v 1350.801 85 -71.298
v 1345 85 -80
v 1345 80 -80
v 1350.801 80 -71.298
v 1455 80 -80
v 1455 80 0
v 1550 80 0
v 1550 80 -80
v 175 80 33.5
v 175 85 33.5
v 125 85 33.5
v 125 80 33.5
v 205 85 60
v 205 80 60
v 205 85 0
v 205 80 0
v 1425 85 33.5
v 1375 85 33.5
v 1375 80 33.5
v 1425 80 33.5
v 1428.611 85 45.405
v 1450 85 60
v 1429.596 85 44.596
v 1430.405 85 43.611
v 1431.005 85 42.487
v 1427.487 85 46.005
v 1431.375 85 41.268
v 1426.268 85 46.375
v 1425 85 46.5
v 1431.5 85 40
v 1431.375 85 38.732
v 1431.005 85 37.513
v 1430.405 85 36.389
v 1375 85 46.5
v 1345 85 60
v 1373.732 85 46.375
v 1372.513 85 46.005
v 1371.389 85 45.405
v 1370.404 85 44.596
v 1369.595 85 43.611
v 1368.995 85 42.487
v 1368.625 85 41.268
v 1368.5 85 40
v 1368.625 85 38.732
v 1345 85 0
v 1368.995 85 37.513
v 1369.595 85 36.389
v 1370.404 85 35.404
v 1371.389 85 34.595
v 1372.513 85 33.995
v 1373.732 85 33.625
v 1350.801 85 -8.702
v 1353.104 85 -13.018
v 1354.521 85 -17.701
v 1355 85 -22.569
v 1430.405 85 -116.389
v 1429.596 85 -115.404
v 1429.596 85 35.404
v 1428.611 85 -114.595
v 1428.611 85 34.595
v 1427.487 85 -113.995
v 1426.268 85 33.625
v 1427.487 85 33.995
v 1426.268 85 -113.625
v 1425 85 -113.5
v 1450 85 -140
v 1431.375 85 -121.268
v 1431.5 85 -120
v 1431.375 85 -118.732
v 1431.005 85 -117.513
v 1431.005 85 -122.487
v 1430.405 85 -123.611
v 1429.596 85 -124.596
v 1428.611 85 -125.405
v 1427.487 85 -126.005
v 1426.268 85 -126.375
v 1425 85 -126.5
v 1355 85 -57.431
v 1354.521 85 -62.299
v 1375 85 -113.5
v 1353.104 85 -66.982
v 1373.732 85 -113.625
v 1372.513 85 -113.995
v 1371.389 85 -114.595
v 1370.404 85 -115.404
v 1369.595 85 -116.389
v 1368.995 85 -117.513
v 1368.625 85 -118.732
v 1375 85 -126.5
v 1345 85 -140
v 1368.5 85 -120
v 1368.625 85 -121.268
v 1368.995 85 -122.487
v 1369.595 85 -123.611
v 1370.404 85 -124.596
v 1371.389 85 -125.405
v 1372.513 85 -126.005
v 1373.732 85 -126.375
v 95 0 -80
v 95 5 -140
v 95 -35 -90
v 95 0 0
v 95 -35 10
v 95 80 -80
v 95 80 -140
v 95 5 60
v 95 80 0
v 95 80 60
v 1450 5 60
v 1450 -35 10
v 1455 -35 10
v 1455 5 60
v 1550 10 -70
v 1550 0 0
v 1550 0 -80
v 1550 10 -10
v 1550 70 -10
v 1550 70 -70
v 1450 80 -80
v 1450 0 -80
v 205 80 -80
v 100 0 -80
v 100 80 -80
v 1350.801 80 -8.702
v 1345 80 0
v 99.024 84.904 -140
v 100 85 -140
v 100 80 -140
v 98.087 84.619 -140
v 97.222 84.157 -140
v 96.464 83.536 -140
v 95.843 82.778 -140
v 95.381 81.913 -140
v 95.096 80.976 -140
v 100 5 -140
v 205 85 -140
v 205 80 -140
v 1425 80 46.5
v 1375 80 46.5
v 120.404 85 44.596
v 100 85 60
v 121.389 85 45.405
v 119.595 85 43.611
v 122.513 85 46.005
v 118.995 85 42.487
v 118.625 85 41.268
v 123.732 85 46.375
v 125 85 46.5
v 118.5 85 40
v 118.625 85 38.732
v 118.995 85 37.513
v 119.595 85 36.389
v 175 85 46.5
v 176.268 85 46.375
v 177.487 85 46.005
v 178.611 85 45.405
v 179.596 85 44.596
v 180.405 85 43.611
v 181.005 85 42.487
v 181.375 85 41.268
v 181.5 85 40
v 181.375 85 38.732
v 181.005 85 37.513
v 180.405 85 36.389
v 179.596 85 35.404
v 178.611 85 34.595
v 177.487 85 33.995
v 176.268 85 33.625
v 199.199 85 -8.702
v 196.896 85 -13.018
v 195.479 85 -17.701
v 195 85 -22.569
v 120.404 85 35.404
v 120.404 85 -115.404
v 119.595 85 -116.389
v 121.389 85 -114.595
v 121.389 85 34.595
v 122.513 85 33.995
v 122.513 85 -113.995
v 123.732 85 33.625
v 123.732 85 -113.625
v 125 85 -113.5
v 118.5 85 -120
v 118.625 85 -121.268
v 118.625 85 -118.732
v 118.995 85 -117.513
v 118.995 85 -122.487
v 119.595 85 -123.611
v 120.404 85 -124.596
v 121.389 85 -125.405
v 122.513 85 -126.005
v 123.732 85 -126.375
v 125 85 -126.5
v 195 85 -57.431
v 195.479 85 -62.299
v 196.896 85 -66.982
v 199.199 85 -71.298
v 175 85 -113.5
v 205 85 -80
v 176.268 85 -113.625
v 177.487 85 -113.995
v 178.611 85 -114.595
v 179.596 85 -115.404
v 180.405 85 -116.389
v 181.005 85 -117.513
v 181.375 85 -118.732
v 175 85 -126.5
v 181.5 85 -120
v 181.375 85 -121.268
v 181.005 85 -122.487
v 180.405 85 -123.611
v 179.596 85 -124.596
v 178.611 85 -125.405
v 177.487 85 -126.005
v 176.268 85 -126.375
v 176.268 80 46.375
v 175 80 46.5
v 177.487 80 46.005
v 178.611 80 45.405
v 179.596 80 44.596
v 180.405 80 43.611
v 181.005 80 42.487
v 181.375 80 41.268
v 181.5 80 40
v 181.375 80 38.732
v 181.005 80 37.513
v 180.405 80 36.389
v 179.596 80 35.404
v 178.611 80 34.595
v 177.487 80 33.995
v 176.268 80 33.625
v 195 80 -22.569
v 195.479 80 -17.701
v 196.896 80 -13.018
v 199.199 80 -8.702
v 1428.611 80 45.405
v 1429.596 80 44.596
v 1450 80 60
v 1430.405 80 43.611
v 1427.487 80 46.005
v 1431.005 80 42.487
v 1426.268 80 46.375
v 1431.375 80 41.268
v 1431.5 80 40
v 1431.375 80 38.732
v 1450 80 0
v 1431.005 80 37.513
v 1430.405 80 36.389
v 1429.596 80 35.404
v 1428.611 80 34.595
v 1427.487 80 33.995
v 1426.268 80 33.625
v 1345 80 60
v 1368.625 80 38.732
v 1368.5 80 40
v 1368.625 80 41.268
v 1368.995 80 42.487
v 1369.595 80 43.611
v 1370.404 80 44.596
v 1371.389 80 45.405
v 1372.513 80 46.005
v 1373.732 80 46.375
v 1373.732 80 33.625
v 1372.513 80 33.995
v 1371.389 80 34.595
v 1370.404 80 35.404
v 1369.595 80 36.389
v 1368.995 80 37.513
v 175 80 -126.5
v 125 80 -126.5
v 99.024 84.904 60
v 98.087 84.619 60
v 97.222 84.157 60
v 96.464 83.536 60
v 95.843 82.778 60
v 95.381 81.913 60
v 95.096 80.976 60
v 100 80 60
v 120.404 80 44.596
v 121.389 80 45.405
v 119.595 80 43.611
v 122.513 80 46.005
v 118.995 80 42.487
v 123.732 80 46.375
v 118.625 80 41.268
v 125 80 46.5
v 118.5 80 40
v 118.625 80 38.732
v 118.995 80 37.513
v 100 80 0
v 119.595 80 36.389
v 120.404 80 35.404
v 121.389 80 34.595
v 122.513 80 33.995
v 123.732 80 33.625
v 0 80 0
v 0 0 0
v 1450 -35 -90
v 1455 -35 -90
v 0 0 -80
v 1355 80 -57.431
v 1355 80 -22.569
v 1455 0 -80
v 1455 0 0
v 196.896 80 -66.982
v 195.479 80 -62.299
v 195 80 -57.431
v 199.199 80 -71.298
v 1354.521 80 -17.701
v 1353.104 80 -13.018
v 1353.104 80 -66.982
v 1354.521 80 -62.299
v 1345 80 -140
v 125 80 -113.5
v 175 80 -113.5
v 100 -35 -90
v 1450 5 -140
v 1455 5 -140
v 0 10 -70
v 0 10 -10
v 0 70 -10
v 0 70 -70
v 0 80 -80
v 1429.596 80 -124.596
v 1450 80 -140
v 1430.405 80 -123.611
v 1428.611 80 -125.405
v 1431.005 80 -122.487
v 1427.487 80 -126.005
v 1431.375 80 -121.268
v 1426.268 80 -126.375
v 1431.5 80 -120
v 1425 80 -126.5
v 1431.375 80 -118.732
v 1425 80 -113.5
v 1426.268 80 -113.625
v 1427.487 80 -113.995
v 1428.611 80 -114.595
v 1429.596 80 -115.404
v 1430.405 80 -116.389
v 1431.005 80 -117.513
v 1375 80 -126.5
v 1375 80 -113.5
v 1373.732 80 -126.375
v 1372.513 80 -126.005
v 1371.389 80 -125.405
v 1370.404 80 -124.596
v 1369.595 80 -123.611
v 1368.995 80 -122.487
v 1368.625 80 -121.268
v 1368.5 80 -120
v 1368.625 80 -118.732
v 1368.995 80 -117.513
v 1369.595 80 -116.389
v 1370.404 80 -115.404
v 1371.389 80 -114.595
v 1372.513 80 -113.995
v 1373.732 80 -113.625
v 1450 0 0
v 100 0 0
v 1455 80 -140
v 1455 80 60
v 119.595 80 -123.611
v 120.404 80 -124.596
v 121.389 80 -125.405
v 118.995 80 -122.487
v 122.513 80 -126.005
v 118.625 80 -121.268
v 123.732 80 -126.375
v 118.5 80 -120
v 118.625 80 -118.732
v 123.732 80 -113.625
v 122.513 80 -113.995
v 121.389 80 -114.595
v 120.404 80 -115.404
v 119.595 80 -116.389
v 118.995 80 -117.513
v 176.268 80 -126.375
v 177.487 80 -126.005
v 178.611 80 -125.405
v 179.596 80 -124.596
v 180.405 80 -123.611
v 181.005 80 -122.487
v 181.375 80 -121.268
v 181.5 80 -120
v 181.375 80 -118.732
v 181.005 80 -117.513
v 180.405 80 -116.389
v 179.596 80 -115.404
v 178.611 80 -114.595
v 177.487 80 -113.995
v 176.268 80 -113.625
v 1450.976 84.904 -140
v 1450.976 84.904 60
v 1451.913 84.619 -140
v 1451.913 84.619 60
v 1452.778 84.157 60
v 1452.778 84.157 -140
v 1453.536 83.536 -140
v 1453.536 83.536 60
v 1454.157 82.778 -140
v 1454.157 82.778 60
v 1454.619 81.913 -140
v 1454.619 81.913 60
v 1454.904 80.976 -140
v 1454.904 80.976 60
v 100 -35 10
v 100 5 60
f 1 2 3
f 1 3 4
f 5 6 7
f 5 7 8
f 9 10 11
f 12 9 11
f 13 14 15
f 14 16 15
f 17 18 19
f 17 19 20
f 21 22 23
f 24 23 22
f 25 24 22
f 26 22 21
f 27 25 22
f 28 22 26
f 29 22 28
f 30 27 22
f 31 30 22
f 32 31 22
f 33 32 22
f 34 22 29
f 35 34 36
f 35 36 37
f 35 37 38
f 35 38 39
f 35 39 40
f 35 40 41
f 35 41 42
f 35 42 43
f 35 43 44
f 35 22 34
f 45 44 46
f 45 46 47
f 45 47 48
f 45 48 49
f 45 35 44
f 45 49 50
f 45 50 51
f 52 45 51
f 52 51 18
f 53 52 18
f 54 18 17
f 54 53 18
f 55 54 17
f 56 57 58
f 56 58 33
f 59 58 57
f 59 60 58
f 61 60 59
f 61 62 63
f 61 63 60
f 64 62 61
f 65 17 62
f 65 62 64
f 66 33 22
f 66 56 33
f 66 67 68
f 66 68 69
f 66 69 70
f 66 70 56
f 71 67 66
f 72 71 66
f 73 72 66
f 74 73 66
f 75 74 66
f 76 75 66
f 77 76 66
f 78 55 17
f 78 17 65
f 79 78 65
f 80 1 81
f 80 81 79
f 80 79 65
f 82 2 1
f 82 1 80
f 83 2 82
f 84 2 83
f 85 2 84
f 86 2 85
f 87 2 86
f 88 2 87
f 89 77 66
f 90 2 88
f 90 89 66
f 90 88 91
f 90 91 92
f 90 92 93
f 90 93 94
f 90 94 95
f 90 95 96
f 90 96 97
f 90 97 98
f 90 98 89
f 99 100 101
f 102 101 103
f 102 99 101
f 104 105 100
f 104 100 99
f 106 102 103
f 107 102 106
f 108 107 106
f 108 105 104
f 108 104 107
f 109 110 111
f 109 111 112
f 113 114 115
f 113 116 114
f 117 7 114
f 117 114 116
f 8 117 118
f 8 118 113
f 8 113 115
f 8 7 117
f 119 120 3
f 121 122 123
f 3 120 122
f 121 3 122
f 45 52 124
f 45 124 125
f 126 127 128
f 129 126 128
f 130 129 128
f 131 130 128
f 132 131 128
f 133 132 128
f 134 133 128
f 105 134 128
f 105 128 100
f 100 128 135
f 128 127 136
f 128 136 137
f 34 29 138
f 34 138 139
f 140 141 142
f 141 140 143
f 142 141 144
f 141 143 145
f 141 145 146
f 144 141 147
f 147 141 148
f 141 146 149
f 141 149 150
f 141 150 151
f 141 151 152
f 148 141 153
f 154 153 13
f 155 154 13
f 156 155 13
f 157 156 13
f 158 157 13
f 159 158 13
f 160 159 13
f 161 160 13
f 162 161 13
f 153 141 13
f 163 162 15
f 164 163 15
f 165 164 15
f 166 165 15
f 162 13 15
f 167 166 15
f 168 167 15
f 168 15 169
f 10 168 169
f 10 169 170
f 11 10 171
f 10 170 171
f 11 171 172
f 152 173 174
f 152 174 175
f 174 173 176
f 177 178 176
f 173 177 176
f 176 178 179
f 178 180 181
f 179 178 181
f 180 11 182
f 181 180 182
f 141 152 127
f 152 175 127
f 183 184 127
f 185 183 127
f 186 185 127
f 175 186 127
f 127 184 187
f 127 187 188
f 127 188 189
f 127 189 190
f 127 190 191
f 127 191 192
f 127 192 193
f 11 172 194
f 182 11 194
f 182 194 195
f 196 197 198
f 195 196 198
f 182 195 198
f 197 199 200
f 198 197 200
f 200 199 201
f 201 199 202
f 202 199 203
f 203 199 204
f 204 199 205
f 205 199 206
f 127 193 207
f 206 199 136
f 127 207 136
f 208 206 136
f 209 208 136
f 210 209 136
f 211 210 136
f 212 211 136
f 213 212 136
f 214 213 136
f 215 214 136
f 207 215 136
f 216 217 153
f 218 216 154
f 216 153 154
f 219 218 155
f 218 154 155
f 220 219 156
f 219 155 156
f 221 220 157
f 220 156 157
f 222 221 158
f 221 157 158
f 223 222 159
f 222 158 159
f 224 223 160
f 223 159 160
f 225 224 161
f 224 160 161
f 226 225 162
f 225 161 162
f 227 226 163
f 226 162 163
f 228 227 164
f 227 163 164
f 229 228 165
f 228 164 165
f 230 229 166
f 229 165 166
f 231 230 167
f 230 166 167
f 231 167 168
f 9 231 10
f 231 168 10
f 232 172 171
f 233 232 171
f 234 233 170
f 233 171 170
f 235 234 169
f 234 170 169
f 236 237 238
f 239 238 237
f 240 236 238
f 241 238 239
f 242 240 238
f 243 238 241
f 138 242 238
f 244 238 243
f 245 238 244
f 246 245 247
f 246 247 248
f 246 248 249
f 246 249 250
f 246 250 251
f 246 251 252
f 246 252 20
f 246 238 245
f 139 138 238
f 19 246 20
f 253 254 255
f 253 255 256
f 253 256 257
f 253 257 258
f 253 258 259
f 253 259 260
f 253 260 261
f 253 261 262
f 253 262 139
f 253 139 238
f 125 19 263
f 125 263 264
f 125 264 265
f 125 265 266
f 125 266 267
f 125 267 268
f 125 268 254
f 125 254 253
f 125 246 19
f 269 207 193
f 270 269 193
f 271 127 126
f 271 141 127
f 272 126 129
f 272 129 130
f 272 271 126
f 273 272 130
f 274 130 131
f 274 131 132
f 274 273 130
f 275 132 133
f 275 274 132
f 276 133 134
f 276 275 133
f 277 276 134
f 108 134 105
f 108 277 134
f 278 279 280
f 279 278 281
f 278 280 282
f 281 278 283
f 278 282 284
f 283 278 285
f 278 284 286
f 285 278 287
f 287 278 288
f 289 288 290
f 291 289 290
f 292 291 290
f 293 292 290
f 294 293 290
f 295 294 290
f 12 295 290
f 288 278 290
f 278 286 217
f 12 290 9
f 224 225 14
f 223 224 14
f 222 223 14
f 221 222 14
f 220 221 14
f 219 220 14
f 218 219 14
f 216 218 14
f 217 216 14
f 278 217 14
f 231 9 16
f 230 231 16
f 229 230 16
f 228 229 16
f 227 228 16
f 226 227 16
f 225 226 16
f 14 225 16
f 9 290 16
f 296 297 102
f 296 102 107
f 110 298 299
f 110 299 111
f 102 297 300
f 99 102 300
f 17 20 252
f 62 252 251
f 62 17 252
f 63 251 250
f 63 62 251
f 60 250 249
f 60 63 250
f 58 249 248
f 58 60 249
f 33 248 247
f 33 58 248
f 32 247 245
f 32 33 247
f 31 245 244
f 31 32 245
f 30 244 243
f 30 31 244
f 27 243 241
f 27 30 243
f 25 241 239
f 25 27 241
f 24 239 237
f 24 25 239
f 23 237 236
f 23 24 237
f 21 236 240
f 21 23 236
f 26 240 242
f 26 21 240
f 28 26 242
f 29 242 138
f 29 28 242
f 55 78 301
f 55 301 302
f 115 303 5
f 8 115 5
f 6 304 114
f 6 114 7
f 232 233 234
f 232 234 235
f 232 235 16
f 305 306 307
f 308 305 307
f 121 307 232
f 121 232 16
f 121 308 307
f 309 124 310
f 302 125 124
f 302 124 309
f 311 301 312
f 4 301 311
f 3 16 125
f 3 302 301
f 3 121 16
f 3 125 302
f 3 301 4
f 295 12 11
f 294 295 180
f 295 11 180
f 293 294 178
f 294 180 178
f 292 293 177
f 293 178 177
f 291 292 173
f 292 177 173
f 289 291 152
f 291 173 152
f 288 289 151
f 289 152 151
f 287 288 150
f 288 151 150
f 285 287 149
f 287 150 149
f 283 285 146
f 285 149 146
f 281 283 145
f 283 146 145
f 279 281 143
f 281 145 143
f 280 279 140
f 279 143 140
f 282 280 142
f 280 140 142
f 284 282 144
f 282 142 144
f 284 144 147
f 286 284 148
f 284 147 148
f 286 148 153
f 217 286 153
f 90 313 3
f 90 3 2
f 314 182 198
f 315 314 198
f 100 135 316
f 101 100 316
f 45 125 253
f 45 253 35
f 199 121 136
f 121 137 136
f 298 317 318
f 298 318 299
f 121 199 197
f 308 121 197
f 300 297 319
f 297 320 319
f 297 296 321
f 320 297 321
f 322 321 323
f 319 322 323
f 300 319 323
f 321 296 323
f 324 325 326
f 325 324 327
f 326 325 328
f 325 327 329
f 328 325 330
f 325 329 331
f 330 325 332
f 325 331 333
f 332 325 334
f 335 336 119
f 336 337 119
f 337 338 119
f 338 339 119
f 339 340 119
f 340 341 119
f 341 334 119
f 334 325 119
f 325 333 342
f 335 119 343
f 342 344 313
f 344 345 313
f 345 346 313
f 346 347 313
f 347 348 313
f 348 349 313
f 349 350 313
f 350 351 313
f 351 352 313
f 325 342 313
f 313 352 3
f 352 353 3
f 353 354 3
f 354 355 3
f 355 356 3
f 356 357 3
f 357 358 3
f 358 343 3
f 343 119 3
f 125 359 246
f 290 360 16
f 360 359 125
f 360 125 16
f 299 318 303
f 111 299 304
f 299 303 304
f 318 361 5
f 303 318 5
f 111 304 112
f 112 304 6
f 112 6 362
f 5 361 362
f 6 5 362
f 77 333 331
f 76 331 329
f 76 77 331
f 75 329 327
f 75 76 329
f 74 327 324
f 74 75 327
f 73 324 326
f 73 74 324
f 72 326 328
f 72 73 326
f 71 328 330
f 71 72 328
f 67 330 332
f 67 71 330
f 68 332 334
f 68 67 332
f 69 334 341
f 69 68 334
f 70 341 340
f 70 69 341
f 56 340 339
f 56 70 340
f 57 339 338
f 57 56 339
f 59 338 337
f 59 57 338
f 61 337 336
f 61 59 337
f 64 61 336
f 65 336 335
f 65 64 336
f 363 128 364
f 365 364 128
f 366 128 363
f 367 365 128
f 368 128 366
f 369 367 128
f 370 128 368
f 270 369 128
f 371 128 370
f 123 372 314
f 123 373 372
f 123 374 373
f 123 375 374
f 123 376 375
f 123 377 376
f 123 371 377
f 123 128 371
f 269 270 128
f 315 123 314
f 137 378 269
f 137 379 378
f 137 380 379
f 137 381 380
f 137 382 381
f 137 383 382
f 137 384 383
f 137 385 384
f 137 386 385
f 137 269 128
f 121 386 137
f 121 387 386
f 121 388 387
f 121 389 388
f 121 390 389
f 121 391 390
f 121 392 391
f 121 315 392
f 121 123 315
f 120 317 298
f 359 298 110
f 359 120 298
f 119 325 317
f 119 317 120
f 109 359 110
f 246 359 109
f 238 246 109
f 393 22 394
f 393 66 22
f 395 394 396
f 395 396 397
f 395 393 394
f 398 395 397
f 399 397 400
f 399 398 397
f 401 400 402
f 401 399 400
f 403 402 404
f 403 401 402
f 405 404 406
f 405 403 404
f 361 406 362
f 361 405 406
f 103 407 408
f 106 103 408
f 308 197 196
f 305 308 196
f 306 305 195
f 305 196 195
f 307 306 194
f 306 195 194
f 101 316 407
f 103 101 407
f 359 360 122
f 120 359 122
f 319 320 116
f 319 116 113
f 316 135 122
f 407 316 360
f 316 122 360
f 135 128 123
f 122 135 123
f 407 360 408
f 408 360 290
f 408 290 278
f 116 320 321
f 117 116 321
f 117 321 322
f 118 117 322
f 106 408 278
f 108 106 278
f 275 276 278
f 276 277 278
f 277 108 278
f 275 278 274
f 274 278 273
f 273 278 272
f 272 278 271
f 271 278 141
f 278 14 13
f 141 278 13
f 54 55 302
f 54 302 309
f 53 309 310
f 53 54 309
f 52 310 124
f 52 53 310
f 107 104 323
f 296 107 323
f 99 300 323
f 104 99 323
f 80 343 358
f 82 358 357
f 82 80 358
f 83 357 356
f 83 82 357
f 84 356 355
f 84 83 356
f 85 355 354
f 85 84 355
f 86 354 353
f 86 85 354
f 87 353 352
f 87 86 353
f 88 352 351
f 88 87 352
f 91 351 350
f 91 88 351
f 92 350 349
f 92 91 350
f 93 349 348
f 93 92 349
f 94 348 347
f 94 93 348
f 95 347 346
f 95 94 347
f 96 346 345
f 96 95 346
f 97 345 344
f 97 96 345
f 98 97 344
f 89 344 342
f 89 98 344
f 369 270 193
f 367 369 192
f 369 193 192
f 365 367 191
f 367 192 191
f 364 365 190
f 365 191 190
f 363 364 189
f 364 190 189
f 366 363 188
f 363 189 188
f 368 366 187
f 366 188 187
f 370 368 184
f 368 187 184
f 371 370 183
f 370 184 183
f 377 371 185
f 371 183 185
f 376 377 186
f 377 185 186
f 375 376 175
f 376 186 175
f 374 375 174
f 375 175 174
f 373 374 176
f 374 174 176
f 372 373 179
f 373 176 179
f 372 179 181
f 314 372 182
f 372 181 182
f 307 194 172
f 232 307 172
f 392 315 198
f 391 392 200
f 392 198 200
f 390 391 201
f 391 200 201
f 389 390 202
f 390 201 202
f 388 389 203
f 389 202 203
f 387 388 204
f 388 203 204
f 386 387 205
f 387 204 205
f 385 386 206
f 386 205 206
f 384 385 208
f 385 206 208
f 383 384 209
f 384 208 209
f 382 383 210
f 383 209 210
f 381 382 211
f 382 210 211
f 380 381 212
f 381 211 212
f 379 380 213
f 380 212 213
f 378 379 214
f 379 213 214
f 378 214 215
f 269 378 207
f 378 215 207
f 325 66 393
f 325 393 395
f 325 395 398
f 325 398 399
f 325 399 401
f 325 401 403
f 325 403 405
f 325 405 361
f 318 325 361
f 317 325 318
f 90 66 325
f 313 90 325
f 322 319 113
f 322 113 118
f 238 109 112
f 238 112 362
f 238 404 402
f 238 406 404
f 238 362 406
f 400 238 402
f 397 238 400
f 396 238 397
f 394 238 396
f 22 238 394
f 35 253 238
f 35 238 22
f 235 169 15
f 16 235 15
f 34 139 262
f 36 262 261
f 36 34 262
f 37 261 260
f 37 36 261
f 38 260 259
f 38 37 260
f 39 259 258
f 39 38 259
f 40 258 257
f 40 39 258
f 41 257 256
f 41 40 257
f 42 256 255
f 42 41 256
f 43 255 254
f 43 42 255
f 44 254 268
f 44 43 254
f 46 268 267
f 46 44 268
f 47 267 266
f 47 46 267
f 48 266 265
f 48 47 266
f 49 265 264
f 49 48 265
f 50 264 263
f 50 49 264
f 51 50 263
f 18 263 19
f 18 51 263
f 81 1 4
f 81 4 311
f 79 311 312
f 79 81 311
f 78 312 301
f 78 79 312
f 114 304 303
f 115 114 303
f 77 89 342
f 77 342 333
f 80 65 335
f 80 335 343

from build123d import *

# Parameters (mm, degrees)
SKETCH3_W                       = 80
SKETCH3_H                       = 80
SKETCH3_W_2                     = 60
SKETCH3_H_2                     = 60
BOSS_EXTRUDE2_DEPTH             = 1550
SKETCH7_W                       = 60
SKETCH7_H                       = 60
BOSS_EXTRUDE3_DEPTH             = 5
BOSS_EXTRUDE4_REACH             = 1560.629
SKETCH8_W                       = 110
SKETCH8_H                       = 5
BOSS_EXTRUDE4_DIRECTION_2_REACH = 1560.629
CUT_EXTRUDE1_DEPTH              = 5
CUT_EXTRUDE2_REACH              = 1562.929
FILLET1_R                       = 5
FILLET1_OF_MIRROR1_R            = 5
FILLET1_OF_MIRROR2_R            = 5


with BuildPart() as part:
    # Sketch3 → Boss-Extrude2 (new body)
    with BuildSketch(Plane(origin=(0, 0, 0), x_dir=(0, 0, -1), z_dir=(1, 0, 0))):
        with Locations((40, 40)):
            Rectangle(SKETCH3_W, SKETCH3_H)
        with Locations((40, 40)):
            Rectangle(SKETCH3_W_2, SKETCH3_H_2, mode=Mode.SUBTRACT)
    extrude(amount=BOSS_EXTRUDE2_DEPTH)

    # Sketch7 → Boss-Extrude3 (add)
    with BuildSketch(Plane(origin=(1450, 0, 0), x_dir=(0, 0, -1), z_dir=(1, 0, 0))):
        Polygon((-60, 85), (140, 85), (140, 5), (90, -35), (-10, -35), (-60, 5), align=None)
        with Locations((40, 40)):
            Rectangle(SKETCH7_W, SKETCH7_H, mode=Mode.SUBTRACT)
    boss_extrude3 = extrude(amount=BOSS_EXTRUDE3_DEPTH)

    # Boss-Extrude4: up to this face of the body (flat: up to its plane)
    boss_extrude4_end = Plane(part.part.faces().sort_by_distance((1452.5, 45, -140))[0])
    # Sketch8 → Boss-Extrude4 (add, up to the picked face)
    with BuildSketch(Plane(origin=(0, 0, -80), x_dir=(-1, 0, 0), z_dir=(0, 0, -1)), mode=Mode.PRIVATE) as boss_extrude4_sk1:
        with Locations((-1400, 82.5)):
            Rectangle(SKETCH8_W, SKETCH8_H)
    boss_extrude4_tool1 = split(extrude(boss_extrude4_sk1.sketch, amount=BOSS_EXTRUDE4_REACH, mode=Mode.PRIVATE), bisect_by=boss_extrude4_end, keep=Keep.BOTH, mode=Mode.PRIVATE)
    boss_extrude4 = boss_extrude4_tool1.solids().sort_by(Axis((1400, 82.5, -80), (0, 0, -1)))[0]
    add(boss_extrude4)

    # Boss-Extrude4 direction 2: up to this face of the body (flat: up to its plane)
    boss_extrude4_direction_2_end = Plane(part.part.faces().sort_by_distance((1452.5, 45, 60))[0])
    # Sketch8 → Boss-Extrude4 direction 2 (add, up to the picked face)
    with BuildSketch(Plane(origin=(0, 0, -80), x_dir=(-1, 0, 0), z_dir=(0, 0, -1)), mode=Mode.PRIVATE) as boss_extrude4_direction_2_sk1:
        with Locations((-1400, 82.5)):
            Rectangle(SKETCH8_W, SKETCH8_H)
    boss_extrude4_direction_2_tool1 = split(extrude(boss_extrude4_direction_2_sk1.sketch, amount=-BOSS_EXTRUDE4_DIRECTION_2_REACH, mode=Mode.PRIVATE), bisect_by=boss_extrude4_direction_2_end, keep=Keep.BOTH, mode=Mode.PRIVATE)
    boss_extrude4_direction_2 = boss_extrude4_direction_2_tool1.solids().sort_by(Axis((1400, 82.5, -80), (0, 0, 1)))[0]
    add(boss_extrude4_direction_2)

    # Sketch9 → Cut-Extrude1 (cut)
    with BuildSketch(Plane(origin=(0, 85, 0), x_dir=(1, 0, 0), z_dir=(0, 1, 0))):
        with BuildLine():
            Line((1345, 80), (1350.801257358, 71.298113962))
            ThreePointArc((1350.801257358, 71.298113962), (1353.927300662, 64.675212774), (1355, 57.430609057))
            Line((1355, 57.430609057), (1355, 22.569390943))
            ThreePointArc((1355, 22.569390943), (1353.927300662, 15.324787226), (1350.801257358, 8.701886038))
            Line((1350.801257358, 8.701886038), (1345, 0))
            Line((1345, 0), (1345, 80))
        make_face()
    cut_extrude1 = extrude(amount=-CUT_EXTRUDE1_DEPTH, mode=Mode.SUBTRACT)

    # Sketch10 → Cut-Extrude2 (cut, up to next)
    with BuildSketch(Plane(origin=(0, 85, 0), x_dir=(1, 0, 0), z_dir=(0, 1, 0)), mode=Mode.PRIVATE) as cut_extrude2_sk1:
        with BuildLine():
            Line((1375, 126.5), (1425, 126.5))
            ThreePointArc((1425, 126.5), (1431.5, 120), (1425, 113.5))
            Line((1425, 113.5), (1375, 113.5))
            ThreePointArc((1375, 113.5), (1368.5, 120), (1375, 126.5))
        make_face()
    cut_extrude2_tool1 = extrude(cut_extrude2_sk1.sketch, amount=-CUT_EXTRUDE2_REACH, mode=Mode.PRIVATE) & part.part
    # Sketch10 → Cut-Extrude2 (cut, up to next)
    with BuildSketch(Plane(origin=(0, 85, 0), x_dir=(1, 0, 0), z_dir=(0, 1, 0)), mode=Mode.PRIVATE) as cut_extrude2_sk2:
        with BuildLine():
            Line((1375, -33.5), (1425, -33.5))
            ThreePointArc((1425, -33.5), (1431.5, -40), (1425, -46.5))
            Line((1425, -46.5), (1375, -46.5))
            ThreePointArc((1375, -46.5), (1368.5, -40), (1375, -33.5))
        make_face()
    cut_extrude2_tool2 = extrude(cut_extrude2_sk2.sketch, amount=-CUT_EXTRUDE2_REACH, mode=Mode.PRIVATE) & part.part
    cut_extrude2_1 = cut_extrude2_tool1.solids().sort_by_distance((1400, 85, -120))[0]
    add(cut_extrude2_1, mode=Mode.SUBTRACT)
    cut_extrude2_2 = cut_extrude2_tool2.solids().sort_by_distance((1400, 85, 40))[0]
    add(cut_extrude2_2, mode=Mode.SUBTRACT)
    cut_extrude2 = cut_extrude2_1 + cut_extrude2_2  # Cut-Extrude2 as one shape, for the pattern or mirror that repeats it

    # Fillet1
    fillet1_edges = [part.edges().sort_by_distance(p)[0] for p in [
        (1455, 85, -40),
    ]]
    fillet(fillet1_edges, radius=FILLET1_R - 0.0001)  # a hair under: the kernel refuses the full size

    # Mirror1: Boss-Extrude3 across plane
    add(boss_extrude3.mirror(Plane(origin=(775, 0, 0), x_dir=(0, 0, 1), z_dir=(1, 0, 0))))

    # Fillet1 of Mirror1
    fillet1_of_mirror1_edges = [part.edges().sort_by_distance(p)[0] for p in [
        (95, 85, -40),
    ]]
    fillet(fillet1_of_mirror1_edges, radius=FILLET1_OF_MIRROR1_R - 0.0001)  # a hair under: the kernel refuses the full size

    # Mirror2: Boss-Extrude3, Boss-Extrude4, Boss-Extrude4 direction 2, Cut-Extrude1, Cut-Extrude2 across plane
    add(boss_extrude3.mirror(Plane(origin=(775, 0, 0), x_dir=(0, 0, 1), z_dir=(1, 0, 0))))
    add(boss_extrude4.mirror(Plane(origin=(775, 0, 0), x_dir=(0, 0, 1), z_dir=(1, 0, 0))))
    add(boss_extrude4_direction_2.mirror(Plane(origin=(775, 0, 0), x_dir=(0, 0, 1), z_dir=(1, 0, 0))))
    add(cut_extrude1.mirror(Plane(origin=(775, 0, 0), x_dir=(0, 0, 1), z_dir=(1, 0, 0))), mode=Mode.SUBTRACT)
    add(cut_extrude2.mirror(Plane(origin=(775, 0, 0), x_dir=(0, 0, 1), z_dir=(1, 0, 0))), mode=Mode.SUBTRACT)

    # Fillet1 of Mirror2
    fillet1_of_mirror2_edges = [part.edges().sort_by_distance(p)[0] for p in [
        (95, 85, -40),
    ]]
    fillet(fillet1_of_mirror2_edges, radius=FILLET1_OF_MIRROR2_R - 0.0001)  # a hair under: the kernel refuses the full size


solid = part.part
